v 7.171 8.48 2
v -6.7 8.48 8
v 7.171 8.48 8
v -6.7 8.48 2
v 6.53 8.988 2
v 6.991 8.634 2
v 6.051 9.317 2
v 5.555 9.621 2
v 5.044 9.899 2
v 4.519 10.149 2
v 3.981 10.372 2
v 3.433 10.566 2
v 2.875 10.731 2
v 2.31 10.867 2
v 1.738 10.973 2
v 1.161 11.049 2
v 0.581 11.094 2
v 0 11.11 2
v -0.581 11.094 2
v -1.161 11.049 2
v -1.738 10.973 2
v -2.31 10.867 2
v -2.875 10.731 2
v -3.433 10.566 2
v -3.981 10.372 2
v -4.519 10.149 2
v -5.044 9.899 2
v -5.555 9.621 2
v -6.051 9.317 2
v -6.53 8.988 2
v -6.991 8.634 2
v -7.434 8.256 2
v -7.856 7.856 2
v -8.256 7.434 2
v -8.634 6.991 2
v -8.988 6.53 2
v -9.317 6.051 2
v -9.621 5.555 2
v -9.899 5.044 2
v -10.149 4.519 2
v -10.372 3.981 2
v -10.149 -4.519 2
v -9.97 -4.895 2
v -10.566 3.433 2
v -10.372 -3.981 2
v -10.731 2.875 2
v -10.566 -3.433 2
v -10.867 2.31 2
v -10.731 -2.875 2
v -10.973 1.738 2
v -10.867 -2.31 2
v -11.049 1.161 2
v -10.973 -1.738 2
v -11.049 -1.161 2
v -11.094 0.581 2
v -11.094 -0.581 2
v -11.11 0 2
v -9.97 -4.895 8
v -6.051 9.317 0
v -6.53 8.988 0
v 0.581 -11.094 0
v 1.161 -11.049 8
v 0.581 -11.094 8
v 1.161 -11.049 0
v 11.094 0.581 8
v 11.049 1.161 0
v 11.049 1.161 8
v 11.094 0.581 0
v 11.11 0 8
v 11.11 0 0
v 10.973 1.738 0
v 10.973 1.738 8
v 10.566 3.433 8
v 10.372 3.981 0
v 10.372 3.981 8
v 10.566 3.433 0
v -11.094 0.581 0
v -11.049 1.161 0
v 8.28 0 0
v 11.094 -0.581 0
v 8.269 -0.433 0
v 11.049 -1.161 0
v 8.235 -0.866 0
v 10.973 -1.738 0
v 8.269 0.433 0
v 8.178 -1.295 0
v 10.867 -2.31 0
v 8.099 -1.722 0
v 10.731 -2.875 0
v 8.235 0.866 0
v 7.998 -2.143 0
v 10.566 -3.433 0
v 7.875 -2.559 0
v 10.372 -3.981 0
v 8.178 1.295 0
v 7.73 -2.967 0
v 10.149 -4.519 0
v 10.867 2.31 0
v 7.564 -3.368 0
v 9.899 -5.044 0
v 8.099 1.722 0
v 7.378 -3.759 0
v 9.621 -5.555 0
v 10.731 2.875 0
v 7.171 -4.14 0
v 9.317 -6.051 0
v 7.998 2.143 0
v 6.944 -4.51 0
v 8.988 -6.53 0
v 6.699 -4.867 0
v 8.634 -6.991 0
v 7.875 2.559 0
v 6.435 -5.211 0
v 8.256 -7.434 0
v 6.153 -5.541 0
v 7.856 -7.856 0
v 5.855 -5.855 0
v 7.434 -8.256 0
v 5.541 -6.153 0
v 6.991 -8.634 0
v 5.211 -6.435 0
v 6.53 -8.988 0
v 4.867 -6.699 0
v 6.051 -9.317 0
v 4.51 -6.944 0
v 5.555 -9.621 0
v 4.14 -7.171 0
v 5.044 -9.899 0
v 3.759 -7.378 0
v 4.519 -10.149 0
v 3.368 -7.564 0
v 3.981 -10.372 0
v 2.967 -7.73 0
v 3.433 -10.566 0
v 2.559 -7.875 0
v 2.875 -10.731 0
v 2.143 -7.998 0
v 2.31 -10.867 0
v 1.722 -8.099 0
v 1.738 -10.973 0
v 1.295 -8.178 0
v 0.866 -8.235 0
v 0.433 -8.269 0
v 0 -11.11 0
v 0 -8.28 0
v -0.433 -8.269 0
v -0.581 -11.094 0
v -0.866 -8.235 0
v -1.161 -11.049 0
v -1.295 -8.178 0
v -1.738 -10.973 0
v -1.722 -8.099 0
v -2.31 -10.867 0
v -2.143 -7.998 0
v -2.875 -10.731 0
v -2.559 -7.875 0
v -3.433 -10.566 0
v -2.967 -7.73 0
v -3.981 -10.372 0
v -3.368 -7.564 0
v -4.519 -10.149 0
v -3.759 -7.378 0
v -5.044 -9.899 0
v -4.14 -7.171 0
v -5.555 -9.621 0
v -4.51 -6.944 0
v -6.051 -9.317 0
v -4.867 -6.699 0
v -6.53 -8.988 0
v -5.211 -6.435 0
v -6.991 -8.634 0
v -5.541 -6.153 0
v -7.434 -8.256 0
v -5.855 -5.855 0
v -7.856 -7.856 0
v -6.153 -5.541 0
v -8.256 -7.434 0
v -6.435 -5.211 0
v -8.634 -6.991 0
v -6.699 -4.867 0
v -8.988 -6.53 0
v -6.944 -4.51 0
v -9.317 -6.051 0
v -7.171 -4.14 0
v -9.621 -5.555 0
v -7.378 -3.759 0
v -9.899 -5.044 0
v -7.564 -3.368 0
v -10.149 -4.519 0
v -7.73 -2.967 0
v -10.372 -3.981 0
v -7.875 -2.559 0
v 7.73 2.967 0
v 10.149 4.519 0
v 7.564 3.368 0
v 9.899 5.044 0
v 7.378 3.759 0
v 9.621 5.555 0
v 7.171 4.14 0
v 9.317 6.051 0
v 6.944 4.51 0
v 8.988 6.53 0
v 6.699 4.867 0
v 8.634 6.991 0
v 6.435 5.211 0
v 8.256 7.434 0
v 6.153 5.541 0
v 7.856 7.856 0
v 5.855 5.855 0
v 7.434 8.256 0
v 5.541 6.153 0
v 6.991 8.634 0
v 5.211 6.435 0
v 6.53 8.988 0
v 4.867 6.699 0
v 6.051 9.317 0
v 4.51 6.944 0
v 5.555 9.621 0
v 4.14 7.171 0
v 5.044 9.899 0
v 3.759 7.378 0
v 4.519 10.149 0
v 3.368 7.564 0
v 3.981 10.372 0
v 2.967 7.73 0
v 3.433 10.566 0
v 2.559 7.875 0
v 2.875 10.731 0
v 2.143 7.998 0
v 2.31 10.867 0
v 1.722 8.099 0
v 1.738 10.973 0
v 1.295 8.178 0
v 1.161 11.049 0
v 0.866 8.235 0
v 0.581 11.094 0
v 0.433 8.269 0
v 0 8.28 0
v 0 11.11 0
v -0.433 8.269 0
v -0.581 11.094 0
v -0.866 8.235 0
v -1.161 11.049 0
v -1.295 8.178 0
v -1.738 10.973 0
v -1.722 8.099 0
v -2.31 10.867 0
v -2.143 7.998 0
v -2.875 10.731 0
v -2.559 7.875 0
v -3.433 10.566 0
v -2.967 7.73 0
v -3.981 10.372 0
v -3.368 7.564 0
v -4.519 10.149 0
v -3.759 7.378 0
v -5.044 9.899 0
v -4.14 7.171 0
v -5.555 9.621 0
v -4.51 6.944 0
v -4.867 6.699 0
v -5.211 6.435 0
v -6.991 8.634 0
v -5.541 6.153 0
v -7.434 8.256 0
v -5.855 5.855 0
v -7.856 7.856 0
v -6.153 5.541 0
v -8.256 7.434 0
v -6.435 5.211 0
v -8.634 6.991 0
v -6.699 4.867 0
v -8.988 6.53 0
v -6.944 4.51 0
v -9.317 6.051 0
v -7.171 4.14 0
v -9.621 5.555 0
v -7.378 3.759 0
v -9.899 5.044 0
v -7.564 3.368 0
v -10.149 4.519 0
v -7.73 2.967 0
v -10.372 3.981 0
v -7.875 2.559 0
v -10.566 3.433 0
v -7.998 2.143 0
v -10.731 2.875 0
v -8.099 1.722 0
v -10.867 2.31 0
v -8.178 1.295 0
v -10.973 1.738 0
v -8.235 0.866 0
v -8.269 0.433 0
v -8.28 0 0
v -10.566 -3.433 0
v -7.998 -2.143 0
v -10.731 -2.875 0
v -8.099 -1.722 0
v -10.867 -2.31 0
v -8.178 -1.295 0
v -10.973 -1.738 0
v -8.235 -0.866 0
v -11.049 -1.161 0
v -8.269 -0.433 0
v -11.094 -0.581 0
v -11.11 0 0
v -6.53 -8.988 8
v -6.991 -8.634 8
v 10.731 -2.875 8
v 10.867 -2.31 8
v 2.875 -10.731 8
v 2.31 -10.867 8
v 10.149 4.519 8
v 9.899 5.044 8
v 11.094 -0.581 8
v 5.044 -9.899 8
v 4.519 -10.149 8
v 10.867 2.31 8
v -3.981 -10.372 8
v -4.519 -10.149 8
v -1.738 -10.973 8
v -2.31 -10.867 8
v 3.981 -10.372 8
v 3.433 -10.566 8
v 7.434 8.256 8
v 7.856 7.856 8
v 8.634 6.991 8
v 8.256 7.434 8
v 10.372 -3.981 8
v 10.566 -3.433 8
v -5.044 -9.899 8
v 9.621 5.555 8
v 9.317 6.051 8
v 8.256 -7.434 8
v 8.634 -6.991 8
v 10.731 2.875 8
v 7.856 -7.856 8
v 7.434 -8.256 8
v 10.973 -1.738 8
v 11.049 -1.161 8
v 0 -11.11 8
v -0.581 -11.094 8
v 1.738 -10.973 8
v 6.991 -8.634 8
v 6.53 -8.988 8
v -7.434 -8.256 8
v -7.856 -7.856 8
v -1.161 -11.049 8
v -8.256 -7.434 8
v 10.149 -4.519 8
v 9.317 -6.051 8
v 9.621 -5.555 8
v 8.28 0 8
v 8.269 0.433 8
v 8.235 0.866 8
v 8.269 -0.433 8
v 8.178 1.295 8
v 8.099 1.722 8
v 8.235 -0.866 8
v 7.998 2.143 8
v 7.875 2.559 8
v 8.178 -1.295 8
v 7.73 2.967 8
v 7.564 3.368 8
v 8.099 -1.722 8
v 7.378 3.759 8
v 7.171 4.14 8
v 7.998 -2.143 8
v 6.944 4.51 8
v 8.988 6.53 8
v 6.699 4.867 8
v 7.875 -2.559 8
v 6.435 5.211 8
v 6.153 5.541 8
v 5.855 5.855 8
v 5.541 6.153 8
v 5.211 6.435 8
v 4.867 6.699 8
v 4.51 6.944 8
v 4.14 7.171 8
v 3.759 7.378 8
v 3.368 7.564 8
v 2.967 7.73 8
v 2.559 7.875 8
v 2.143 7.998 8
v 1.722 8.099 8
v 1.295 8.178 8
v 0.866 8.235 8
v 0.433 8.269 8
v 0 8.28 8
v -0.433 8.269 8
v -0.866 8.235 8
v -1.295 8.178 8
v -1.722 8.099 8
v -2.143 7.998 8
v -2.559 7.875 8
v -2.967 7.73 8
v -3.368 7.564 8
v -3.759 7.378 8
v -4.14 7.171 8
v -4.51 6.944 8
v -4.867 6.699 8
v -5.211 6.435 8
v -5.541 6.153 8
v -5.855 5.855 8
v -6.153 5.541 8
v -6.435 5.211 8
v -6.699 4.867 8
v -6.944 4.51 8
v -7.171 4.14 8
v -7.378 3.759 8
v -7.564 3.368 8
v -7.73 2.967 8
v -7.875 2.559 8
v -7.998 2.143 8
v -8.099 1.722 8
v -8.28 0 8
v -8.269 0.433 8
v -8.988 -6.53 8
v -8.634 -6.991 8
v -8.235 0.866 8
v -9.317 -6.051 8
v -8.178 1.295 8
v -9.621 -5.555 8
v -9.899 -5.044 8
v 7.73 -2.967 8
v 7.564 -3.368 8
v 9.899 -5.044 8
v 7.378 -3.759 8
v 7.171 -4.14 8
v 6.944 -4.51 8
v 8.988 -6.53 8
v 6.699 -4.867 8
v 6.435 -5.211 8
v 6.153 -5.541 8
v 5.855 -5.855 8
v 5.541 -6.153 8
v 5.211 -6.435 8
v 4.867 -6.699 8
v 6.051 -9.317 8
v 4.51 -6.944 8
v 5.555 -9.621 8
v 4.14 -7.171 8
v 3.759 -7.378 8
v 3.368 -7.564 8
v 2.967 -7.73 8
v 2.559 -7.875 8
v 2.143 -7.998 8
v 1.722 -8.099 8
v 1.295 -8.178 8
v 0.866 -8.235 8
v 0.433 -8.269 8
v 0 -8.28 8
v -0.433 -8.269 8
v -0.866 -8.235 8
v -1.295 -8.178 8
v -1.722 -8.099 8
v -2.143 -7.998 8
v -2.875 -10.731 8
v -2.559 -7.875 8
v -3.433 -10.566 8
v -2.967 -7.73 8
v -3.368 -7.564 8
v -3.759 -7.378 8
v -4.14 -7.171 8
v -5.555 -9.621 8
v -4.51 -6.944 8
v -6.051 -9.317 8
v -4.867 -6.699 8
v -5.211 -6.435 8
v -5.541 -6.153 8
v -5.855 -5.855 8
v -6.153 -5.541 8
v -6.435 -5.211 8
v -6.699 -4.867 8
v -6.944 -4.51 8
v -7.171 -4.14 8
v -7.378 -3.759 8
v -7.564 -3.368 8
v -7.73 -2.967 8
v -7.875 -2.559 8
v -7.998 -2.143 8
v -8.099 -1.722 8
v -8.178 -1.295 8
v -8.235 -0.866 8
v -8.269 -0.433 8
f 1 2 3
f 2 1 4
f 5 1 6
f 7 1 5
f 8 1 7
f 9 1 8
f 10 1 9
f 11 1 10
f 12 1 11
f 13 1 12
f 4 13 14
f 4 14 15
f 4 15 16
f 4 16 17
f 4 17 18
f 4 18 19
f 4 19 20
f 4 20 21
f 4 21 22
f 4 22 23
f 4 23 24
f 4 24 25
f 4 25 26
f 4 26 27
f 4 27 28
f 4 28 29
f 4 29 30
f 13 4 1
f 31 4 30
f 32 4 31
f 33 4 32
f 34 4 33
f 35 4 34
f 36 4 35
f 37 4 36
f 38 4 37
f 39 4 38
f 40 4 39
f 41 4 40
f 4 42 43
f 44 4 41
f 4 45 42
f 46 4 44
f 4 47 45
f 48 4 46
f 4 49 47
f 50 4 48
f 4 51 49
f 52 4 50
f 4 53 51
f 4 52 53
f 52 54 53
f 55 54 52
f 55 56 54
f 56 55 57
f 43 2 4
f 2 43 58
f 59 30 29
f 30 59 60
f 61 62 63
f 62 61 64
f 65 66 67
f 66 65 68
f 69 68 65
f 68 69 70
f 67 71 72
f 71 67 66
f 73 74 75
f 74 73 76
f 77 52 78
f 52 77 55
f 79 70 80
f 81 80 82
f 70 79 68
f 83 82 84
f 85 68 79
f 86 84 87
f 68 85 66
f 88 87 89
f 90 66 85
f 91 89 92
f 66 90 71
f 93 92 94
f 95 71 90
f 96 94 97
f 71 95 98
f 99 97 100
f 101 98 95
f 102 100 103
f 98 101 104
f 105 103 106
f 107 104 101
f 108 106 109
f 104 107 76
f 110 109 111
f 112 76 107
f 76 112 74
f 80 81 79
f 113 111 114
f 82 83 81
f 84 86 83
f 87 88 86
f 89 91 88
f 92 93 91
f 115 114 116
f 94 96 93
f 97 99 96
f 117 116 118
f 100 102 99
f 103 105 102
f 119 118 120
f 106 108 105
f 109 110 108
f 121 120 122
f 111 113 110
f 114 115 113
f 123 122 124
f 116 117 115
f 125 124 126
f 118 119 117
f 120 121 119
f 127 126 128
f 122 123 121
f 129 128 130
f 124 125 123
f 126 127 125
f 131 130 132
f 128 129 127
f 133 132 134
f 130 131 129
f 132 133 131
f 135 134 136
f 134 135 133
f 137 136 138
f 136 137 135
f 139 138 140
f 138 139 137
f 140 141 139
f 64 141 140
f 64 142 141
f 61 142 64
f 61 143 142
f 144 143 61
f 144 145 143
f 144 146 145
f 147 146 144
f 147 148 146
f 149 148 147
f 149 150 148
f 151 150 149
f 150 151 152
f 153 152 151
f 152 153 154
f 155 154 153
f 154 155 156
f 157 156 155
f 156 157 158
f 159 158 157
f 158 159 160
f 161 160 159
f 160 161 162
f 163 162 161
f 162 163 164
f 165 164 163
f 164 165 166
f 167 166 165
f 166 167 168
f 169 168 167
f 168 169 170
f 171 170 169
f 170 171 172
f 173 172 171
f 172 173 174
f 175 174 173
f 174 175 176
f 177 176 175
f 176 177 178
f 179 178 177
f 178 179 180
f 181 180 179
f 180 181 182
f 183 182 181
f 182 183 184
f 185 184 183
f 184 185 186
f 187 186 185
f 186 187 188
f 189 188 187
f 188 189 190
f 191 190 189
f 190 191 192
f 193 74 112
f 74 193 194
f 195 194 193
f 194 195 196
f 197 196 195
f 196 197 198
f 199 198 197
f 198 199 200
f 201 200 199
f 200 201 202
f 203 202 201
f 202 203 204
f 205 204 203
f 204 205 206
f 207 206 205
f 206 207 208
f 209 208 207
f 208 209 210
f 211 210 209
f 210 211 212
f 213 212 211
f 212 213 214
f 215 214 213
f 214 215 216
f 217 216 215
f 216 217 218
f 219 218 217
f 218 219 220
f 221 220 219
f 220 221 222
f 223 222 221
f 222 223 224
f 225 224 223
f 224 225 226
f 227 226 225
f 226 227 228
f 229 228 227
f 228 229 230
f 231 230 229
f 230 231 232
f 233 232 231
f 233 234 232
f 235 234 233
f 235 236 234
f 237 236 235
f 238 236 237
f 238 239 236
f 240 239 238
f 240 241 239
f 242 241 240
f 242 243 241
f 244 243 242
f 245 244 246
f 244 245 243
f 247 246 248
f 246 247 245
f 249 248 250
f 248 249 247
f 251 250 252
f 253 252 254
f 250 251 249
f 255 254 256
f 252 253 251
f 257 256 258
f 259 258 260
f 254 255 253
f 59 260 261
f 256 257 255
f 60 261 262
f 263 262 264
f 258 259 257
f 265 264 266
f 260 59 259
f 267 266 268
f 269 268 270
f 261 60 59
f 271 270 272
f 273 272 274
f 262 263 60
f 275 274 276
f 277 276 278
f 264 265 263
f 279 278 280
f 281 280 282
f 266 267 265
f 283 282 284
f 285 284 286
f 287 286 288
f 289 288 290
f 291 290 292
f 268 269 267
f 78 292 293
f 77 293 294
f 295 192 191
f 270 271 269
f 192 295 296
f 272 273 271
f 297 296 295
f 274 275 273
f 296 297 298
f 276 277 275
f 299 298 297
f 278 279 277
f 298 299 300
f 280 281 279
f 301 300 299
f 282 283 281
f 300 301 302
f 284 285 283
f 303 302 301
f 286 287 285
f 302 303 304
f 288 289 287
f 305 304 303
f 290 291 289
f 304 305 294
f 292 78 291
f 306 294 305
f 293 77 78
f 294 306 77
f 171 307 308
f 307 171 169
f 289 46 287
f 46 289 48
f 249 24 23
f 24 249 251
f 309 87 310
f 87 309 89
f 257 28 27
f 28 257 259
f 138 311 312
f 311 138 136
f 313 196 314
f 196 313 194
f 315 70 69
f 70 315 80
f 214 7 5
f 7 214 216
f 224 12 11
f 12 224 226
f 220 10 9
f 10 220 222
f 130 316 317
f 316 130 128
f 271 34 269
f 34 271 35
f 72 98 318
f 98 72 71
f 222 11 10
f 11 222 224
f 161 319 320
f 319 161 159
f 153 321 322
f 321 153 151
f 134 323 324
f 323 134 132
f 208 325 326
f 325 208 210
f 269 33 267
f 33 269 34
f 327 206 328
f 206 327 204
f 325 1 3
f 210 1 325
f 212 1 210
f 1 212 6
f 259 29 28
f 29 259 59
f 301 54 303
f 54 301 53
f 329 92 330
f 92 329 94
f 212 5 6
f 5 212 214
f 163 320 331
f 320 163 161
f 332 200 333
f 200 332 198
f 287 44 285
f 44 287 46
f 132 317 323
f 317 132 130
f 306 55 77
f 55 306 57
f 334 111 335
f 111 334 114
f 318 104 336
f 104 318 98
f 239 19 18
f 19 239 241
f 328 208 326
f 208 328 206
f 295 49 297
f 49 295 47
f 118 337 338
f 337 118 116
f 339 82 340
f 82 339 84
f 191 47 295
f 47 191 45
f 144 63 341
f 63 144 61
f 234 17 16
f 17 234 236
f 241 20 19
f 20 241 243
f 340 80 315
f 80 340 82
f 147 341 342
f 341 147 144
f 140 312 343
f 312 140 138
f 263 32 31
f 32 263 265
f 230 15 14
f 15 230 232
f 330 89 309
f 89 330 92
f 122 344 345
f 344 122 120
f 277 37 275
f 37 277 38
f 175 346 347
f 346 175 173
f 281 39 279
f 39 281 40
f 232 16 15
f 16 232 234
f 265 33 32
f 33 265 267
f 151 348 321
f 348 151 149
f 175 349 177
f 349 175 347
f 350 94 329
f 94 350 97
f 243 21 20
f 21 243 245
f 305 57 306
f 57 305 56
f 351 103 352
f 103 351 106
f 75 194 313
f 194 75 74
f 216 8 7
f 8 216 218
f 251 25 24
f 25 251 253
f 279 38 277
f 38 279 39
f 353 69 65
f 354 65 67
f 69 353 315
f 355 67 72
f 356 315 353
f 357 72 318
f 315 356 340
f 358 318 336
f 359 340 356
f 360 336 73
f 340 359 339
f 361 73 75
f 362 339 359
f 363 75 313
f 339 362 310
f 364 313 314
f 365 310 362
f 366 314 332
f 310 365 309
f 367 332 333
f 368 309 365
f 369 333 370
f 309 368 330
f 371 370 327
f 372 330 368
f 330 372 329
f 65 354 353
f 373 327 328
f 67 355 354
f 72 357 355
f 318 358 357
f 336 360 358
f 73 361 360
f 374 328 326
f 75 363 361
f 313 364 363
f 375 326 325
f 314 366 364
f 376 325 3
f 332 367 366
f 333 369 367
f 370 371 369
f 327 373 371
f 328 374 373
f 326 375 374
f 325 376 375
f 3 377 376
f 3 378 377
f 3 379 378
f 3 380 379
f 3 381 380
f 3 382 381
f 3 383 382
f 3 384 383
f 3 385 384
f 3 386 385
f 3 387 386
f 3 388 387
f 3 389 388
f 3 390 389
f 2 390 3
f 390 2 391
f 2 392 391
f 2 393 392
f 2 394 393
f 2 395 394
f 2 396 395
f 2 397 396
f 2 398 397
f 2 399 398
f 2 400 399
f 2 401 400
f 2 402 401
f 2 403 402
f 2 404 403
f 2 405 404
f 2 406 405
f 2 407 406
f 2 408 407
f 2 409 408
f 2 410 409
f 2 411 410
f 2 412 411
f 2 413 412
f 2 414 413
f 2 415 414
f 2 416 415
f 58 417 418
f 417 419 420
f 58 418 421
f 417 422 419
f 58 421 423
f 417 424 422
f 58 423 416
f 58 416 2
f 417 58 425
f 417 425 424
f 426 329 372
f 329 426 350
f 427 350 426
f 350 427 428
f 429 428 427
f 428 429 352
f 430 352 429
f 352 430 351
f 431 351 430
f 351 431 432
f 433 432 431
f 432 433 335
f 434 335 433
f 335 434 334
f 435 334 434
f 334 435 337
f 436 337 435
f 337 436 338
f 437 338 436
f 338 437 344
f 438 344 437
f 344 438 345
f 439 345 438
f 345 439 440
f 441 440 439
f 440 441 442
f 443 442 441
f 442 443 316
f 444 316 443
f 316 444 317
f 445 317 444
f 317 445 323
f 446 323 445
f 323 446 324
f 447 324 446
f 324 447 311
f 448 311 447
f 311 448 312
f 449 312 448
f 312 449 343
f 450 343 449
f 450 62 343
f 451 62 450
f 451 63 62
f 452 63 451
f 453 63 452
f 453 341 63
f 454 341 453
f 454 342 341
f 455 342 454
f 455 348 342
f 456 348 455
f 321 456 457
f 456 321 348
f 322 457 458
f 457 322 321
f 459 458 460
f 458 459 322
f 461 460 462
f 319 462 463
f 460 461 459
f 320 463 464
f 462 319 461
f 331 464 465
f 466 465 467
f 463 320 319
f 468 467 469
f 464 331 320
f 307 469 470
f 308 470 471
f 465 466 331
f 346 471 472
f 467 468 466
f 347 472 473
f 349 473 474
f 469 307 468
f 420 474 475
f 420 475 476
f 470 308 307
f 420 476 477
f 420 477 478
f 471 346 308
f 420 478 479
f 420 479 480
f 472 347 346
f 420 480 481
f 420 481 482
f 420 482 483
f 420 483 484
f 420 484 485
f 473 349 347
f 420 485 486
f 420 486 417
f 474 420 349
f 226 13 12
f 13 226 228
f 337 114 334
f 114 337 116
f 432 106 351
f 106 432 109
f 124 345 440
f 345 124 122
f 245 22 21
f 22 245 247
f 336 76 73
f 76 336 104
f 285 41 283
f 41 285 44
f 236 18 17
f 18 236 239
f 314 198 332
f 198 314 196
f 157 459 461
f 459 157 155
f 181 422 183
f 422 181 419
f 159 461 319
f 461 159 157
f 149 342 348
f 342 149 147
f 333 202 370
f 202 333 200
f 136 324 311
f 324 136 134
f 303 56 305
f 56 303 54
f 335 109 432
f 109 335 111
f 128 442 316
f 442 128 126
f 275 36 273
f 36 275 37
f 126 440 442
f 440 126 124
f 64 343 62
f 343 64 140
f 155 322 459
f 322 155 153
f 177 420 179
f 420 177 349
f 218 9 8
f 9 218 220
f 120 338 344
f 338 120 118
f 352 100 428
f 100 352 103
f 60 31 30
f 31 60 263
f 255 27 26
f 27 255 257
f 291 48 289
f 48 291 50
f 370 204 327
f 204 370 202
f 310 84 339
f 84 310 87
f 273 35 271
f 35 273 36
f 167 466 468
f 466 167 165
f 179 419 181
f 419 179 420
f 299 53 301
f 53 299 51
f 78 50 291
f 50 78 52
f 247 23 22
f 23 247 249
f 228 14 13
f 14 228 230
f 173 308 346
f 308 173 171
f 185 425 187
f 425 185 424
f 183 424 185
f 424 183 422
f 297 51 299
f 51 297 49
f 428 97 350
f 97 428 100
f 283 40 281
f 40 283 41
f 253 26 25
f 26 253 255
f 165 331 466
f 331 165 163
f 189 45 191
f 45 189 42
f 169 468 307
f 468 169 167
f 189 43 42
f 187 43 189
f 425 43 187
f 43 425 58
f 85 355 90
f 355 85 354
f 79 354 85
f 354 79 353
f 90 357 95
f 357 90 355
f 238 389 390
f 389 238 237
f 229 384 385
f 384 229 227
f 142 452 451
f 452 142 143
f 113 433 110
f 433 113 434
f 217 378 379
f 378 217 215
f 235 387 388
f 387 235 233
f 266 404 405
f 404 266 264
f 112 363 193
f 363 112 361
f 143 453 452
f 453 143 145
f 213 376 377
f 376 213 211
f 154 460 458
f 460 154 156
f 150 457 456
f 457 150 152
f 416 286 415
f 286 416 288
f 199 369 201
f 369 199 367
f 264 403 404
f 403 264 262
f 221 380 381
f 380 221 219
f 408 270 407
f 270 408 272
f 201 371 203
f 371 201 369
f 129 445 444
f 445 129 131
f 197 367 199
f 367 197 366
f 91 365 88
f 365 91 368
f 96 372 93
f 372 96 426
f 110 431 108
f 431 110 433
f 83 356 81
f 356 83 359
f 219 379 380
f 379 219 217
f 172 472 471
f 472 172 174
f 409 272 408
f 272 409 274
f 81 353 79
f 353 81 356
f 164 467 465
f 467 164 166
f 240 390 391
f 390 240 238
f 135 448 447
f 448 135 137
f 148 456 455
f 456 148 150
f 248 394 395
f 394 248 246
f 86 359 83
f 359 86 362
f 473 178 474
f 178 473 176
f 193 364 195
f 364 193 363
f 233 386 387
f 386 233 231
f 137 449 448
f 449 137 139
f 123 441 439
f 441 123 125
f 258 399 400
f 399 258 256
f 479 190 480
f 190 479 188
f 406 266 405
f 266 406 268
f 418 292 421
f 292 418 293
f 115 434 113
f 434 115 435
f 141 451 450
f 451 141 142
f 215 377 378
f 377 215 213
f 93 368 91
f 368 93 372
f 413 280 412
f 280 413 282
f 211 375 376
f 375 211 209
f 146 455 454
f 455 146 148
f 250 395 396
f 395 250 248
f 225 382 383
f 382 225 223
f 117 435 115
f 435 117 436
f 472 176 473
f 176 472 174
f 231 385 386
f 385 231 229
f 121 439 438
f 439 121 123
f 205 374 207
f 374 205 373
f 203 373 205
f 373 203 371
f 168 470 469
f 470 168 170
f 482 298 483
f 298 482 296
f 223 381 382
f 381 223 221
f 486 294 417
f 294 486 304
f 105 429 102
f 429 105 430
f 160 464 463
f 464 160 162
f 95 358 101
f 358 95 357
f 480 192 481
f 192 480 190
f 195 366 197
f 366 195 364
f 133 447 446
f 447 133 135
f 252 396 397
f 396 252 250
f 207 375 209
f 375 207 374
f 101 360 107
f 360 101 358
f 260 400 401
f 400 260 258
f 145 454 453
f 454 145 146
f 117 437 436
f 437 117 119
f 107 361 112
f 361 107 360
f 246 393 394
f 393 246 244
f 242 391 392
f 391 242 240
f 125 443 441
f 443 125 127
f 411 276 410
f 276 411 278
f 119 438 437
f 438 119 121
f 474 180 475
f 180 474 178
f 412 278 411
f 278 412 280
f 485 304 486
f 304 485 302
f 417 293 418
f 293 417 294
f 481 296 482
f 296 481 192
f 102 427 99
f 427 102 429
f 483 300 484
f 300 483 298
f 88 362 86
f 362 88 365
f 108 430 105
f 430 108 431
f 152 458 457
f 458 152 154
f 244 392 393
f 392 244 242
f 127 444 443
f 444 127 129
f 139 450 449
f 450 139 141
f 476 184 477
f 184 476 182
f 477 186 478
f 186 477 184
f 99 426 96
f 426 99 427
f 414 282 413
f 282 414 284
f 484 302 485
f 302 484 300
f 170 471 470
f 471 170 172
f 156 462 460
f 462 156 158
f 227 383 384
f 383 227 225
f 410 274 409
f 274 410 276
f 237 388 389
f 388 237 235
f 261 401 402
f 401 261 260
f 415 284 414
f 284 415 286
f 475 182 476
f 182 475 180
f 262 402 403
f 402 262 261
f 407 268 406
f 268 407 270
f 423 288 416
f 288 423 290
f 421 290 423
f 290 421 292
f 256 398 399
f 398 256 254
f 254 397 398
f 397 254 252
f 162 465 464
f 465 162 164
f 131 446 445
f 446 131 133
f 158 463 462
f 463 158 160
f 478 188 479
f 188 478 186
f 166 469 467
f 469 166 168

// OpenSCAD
// file: components/BAT_HLD.scad
//BAT-HLD-012-SMT-OTL
//https://www.mouser.se/datasheet/2/238/BAT-HLD-012-SMT%20Diagram-1175215.pdf
BAT_HLD_x = 14;
BAT_HLD_y = 10;
BAT_HLD_z = 4;


//BAT_HLD();

module BAT_HLD(x, y, z, centering) {
    translate([x, y, z])
    cube([BAT_HLD_x, BAT_HLD_y, BAT_HLD_z], centering);
}
// main file
include <components/BAT_HLD.scad>;
detail = 120;

pcb_x = 13;
pcb_y = 18;
pcb_z = 0.6;
finger_circumference = 52; // circumference of 60mm = 19.1mm diameter = jaakko middle finger
ring_height = 8;

rotate([90, 0, 0])
ring_actually(pcb_x, pcb_y, pcb_z, finger_circumference, ring_height);

//PCBs(pcb_x, pcb_y, pcb_z, finger_circumference);

//if not insisting on a particular thickness of the ring, leave last parameter out
module ring_actually(x, y, z, c, h, thickness_insisted) {
    d = c / 3.14;
    r = d / 2;
    alpha = 2 * atan(d / x);
    effective_center = max(x, y) + z;
    ring_thickness = sqrt(1/4 * x * x + r * r) - r + z * sin(alpha);
    
    difference() {
        rotate([270, 0, 0])
        cylinder(h=h, d=d + ring_thickness * 2, $fn=detail);
        rotate([270, 0, 0])
        translate([0,0, -1])
        cylinder(h=h + 2, d=d, $fn=detail);
    
        translate([-0.2, 2, -0.2]) {
            translate([- x /2 - 2, 0, - d / 2 - z - 10])
            cube([x + 4, y, z + 10]);
            translate([- x /2, 0, - d / 2])
            rotate([0, 360 - alpha, 0])
            cube([x + 4, y, z + 10]);
        }
    }

}
/*
difference() {
    rotate([270, 0, 0])
    cylinder(h=h, d=d + ring_thickness * 2, $fn=detail);
    rotate([270, 0, 0])
    translate([0,0, -1])
    cylinder(h=h + 2, d=d, $fn=detail);
    
    translate([-0.1, 2, -0.1]) {
        translate([- x /2 - 2, 0, - d / 2 - z - 10])
        cube([x + 4, y, z + 10]);
        translate([- x /2, 0, - d / 2])
        rotate([0, 360 - alpha, 0])
        cube([x + 4, y, z + 10]);
    }
}
*/

module PCBs(x, y, z, c) {
    d = c / 3.14;
    alpha = 2 * atan(d / x);
    translate([-0.1, 2, -0.1]) {
        translate([- x /2, 0, - d / 2 - z])
        cube([x, y, z]);
        translate([- x /2, 0, - d / 2])
        rotate([0, 360 - alpha, 0])
        cube([x, y, z]);
    }
}
